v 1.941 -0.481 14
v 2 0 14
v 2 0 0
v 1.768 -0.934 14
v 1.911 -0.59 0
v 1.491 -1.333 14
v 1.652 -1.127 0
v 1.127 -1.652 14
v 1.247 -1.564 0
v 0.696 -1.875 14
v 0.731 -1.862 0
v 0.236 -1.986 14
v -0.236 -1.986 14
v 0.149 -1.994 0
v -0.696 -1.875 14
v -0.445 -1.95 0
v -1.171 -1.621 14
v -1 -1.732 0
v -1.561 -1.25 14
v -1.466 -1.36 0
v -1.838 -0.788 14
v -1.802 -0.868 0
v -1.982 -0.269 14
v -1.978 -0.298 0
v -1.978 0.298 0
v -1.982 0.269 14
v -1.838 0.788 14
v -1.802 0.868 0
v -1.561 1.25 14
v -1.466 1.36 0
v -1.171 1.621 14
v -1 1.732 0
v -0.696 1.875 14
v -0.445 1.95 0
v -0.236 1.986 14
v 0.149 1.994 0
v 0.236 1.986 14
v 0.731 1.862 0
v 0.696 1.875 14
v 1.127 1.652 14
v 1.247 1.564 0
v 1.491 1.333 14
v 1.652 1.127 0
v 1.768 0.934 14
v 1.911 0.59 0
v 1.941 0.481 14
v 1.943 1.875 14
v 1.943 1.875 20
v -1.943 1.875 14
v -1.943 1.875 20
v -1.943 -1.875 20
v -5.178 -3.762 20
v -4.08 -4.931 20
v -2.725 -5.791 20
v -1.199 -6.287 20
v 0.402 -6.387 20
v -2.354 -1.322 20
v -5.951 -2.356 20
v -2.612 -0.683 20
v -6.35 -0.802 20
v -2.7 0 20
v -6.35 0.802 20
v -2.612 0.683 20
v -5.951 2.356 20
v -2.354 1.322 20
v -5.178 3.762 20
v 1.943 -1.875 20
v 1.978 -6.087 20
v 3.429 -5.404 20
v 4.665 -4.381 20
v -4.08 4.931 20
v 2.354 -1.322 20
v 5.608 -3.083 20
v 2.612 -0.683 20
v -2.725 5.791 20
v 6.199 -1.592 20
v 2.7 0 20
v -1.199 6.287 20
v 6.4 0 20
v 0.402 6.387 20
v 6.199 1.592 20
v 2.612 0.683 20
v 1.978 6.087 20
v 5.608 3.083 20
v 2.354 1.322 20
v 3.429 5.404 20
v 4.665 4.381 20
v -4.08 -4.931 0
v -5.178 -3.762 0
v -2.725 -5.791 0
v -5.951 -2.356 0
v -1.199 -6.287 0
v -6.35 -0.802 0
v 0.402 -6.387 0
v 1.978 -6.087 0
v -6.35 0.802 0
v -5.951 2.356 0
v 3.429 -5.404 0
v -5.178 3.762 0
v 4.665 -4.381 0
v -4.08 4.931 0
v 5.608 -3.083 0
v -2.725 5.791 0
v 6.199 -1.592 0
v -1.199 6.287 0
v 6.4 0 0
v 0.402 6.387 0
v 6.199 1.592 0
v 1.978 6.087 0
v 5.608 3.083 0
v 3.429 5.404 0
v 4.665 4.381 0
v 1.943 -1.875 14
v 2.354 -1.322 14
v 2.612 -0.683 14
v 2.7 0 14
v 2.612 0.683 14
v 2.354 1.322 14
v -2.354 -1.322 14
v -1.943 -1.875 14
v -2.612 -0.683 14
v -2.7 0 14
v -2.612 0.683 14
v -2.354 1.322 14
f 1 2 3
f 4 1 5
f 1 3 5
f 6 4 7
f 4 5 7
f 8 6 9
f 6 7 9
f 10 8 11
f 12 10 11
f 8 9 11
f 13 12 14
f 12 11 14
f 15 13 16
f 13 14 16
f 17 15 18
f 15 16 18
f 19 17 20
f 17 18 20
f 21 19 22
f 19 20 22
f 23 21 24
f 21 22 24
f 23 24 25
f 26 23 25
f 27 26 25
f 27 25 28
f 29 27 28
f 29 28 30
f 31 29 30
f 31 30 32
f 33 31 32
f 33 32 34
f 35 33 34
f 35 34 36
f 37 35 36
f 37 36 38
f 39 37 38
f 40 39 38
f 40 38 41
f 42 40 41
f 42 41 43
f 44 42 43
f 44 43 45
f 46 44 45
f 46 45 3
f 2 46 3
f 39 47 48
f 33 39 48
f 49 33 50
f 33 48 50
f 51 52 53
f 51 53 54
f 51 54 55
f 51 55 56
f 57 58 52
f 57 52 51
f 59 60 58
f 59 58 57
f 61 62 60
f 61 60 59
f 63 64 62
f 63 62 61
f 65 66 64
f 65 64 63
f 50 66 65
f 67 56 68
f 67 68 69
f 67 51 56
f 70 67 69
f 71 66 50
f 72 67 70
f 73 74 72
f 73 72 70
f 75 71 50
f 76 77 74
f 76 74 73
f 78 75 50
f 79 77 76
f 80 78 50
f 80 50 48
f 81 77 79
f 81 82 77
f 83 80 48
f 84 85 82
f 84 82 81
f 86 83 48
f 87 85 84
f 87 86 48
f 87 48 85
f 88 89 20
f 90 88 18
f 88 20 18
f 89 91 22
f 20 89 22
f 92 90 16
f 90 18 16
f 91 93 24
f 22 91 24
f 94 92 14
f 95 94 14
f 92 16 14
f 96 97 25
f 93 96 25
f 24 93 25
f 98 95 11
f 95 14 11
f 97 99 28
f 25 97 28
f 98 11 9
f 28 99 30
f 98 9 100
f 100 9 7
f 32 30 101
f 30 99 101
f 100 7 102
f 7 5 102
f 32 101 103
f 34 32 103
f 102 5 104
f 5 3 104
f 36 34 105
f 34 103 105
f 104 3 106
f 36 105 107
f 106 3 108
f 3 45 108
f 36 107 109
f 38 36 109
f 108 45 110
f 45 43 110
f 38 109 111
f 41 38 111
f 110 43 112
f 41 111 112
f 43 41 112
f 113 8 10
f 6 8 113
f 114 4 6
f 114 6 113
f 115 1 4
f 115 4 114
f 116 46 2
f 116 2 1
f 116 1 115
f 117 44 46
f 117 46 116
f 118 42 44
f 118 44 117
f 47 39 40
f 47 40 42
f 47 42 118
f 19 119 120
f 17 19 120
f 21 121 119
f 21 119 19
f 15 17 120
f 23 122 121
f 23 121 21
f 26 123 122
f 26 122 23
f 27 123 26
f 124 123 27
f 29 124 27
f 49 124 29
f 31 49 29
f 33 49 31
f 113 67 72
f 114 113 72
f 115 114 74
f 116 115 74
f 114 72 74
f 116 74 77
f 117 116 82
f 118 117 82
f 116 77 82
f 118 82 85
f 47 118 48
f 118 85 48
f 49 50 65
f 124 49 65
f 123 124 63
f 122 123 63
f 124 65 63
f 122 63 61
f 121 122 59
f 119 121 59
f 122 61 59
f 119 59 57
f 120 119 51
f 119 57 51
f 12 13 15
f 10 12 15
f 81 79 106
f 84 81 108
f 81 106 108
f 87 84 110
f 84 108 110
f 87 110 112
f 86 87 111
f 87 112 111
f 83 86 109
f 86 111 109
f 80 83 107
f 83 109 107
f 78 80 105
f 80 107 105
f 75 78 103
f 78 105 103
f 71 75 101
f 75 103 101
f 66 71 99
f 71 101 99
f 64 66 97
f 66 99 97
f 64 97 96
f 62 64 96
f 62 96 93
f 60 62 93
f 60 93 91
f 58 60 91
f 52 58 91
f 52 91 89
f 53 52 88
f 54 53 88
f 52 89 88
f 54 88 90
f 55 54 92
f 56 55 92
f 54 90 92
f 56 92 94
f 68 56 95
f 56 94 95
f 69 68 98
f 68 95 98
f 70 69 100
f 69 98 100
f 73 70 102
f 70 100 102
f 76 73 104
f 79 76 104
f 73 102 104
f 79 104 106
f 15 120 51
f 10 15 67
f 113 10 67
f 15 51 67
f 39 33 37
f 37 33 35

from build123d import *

# Parameters (mm, degrees)
F0_R     = 6.4
F1_DEPTH = 20
F3_DEPTH = 6
F4_R     = 2
F5_DEPTH = 14


# Not quite as in the source:
# - a feature names something its author has since deleted; it is built from what else it names


with BuildPart() as f1:
    # F0 (on Top) → F1 (new body)
    with BuildSketch(Plane.XY):
        Circle(F0_R)
    extrude(amount=F1_DEPTH)

    # F2 (on face) → F3 (cut)
    with BuildSketch(Plane.XY.offset(20)):
        with BuildLine():
            Line((1.942775077, 1.875), (-1.942775077, 1.875))
            ThreePointArc((-1.942775077, 1.875), (-2.7, 0), (-1.942775077, -1.875))
            Line((-1.942775077, -1.875), (1.942775077, -1.875))
            ThreePointArc((1.942775077, -1.875), (2.7, 0), (1.942775077, 1.875))
        make_face()
    extrude(amount=-F3_DEPTH, mode=Mode.SUBTRACT)

    # F4 (on face) → F5 (cut, through all)
    with BuildSketch(Plane(origin=(0, 0, 0), x_dir=(1, 0, 0), z_dir=(0, 0, -1))):
        Circle(F4_R)
    extrude(amount=-F5_DEPTH, mode=Mode.SUBTRACT)


solid = f1.part
